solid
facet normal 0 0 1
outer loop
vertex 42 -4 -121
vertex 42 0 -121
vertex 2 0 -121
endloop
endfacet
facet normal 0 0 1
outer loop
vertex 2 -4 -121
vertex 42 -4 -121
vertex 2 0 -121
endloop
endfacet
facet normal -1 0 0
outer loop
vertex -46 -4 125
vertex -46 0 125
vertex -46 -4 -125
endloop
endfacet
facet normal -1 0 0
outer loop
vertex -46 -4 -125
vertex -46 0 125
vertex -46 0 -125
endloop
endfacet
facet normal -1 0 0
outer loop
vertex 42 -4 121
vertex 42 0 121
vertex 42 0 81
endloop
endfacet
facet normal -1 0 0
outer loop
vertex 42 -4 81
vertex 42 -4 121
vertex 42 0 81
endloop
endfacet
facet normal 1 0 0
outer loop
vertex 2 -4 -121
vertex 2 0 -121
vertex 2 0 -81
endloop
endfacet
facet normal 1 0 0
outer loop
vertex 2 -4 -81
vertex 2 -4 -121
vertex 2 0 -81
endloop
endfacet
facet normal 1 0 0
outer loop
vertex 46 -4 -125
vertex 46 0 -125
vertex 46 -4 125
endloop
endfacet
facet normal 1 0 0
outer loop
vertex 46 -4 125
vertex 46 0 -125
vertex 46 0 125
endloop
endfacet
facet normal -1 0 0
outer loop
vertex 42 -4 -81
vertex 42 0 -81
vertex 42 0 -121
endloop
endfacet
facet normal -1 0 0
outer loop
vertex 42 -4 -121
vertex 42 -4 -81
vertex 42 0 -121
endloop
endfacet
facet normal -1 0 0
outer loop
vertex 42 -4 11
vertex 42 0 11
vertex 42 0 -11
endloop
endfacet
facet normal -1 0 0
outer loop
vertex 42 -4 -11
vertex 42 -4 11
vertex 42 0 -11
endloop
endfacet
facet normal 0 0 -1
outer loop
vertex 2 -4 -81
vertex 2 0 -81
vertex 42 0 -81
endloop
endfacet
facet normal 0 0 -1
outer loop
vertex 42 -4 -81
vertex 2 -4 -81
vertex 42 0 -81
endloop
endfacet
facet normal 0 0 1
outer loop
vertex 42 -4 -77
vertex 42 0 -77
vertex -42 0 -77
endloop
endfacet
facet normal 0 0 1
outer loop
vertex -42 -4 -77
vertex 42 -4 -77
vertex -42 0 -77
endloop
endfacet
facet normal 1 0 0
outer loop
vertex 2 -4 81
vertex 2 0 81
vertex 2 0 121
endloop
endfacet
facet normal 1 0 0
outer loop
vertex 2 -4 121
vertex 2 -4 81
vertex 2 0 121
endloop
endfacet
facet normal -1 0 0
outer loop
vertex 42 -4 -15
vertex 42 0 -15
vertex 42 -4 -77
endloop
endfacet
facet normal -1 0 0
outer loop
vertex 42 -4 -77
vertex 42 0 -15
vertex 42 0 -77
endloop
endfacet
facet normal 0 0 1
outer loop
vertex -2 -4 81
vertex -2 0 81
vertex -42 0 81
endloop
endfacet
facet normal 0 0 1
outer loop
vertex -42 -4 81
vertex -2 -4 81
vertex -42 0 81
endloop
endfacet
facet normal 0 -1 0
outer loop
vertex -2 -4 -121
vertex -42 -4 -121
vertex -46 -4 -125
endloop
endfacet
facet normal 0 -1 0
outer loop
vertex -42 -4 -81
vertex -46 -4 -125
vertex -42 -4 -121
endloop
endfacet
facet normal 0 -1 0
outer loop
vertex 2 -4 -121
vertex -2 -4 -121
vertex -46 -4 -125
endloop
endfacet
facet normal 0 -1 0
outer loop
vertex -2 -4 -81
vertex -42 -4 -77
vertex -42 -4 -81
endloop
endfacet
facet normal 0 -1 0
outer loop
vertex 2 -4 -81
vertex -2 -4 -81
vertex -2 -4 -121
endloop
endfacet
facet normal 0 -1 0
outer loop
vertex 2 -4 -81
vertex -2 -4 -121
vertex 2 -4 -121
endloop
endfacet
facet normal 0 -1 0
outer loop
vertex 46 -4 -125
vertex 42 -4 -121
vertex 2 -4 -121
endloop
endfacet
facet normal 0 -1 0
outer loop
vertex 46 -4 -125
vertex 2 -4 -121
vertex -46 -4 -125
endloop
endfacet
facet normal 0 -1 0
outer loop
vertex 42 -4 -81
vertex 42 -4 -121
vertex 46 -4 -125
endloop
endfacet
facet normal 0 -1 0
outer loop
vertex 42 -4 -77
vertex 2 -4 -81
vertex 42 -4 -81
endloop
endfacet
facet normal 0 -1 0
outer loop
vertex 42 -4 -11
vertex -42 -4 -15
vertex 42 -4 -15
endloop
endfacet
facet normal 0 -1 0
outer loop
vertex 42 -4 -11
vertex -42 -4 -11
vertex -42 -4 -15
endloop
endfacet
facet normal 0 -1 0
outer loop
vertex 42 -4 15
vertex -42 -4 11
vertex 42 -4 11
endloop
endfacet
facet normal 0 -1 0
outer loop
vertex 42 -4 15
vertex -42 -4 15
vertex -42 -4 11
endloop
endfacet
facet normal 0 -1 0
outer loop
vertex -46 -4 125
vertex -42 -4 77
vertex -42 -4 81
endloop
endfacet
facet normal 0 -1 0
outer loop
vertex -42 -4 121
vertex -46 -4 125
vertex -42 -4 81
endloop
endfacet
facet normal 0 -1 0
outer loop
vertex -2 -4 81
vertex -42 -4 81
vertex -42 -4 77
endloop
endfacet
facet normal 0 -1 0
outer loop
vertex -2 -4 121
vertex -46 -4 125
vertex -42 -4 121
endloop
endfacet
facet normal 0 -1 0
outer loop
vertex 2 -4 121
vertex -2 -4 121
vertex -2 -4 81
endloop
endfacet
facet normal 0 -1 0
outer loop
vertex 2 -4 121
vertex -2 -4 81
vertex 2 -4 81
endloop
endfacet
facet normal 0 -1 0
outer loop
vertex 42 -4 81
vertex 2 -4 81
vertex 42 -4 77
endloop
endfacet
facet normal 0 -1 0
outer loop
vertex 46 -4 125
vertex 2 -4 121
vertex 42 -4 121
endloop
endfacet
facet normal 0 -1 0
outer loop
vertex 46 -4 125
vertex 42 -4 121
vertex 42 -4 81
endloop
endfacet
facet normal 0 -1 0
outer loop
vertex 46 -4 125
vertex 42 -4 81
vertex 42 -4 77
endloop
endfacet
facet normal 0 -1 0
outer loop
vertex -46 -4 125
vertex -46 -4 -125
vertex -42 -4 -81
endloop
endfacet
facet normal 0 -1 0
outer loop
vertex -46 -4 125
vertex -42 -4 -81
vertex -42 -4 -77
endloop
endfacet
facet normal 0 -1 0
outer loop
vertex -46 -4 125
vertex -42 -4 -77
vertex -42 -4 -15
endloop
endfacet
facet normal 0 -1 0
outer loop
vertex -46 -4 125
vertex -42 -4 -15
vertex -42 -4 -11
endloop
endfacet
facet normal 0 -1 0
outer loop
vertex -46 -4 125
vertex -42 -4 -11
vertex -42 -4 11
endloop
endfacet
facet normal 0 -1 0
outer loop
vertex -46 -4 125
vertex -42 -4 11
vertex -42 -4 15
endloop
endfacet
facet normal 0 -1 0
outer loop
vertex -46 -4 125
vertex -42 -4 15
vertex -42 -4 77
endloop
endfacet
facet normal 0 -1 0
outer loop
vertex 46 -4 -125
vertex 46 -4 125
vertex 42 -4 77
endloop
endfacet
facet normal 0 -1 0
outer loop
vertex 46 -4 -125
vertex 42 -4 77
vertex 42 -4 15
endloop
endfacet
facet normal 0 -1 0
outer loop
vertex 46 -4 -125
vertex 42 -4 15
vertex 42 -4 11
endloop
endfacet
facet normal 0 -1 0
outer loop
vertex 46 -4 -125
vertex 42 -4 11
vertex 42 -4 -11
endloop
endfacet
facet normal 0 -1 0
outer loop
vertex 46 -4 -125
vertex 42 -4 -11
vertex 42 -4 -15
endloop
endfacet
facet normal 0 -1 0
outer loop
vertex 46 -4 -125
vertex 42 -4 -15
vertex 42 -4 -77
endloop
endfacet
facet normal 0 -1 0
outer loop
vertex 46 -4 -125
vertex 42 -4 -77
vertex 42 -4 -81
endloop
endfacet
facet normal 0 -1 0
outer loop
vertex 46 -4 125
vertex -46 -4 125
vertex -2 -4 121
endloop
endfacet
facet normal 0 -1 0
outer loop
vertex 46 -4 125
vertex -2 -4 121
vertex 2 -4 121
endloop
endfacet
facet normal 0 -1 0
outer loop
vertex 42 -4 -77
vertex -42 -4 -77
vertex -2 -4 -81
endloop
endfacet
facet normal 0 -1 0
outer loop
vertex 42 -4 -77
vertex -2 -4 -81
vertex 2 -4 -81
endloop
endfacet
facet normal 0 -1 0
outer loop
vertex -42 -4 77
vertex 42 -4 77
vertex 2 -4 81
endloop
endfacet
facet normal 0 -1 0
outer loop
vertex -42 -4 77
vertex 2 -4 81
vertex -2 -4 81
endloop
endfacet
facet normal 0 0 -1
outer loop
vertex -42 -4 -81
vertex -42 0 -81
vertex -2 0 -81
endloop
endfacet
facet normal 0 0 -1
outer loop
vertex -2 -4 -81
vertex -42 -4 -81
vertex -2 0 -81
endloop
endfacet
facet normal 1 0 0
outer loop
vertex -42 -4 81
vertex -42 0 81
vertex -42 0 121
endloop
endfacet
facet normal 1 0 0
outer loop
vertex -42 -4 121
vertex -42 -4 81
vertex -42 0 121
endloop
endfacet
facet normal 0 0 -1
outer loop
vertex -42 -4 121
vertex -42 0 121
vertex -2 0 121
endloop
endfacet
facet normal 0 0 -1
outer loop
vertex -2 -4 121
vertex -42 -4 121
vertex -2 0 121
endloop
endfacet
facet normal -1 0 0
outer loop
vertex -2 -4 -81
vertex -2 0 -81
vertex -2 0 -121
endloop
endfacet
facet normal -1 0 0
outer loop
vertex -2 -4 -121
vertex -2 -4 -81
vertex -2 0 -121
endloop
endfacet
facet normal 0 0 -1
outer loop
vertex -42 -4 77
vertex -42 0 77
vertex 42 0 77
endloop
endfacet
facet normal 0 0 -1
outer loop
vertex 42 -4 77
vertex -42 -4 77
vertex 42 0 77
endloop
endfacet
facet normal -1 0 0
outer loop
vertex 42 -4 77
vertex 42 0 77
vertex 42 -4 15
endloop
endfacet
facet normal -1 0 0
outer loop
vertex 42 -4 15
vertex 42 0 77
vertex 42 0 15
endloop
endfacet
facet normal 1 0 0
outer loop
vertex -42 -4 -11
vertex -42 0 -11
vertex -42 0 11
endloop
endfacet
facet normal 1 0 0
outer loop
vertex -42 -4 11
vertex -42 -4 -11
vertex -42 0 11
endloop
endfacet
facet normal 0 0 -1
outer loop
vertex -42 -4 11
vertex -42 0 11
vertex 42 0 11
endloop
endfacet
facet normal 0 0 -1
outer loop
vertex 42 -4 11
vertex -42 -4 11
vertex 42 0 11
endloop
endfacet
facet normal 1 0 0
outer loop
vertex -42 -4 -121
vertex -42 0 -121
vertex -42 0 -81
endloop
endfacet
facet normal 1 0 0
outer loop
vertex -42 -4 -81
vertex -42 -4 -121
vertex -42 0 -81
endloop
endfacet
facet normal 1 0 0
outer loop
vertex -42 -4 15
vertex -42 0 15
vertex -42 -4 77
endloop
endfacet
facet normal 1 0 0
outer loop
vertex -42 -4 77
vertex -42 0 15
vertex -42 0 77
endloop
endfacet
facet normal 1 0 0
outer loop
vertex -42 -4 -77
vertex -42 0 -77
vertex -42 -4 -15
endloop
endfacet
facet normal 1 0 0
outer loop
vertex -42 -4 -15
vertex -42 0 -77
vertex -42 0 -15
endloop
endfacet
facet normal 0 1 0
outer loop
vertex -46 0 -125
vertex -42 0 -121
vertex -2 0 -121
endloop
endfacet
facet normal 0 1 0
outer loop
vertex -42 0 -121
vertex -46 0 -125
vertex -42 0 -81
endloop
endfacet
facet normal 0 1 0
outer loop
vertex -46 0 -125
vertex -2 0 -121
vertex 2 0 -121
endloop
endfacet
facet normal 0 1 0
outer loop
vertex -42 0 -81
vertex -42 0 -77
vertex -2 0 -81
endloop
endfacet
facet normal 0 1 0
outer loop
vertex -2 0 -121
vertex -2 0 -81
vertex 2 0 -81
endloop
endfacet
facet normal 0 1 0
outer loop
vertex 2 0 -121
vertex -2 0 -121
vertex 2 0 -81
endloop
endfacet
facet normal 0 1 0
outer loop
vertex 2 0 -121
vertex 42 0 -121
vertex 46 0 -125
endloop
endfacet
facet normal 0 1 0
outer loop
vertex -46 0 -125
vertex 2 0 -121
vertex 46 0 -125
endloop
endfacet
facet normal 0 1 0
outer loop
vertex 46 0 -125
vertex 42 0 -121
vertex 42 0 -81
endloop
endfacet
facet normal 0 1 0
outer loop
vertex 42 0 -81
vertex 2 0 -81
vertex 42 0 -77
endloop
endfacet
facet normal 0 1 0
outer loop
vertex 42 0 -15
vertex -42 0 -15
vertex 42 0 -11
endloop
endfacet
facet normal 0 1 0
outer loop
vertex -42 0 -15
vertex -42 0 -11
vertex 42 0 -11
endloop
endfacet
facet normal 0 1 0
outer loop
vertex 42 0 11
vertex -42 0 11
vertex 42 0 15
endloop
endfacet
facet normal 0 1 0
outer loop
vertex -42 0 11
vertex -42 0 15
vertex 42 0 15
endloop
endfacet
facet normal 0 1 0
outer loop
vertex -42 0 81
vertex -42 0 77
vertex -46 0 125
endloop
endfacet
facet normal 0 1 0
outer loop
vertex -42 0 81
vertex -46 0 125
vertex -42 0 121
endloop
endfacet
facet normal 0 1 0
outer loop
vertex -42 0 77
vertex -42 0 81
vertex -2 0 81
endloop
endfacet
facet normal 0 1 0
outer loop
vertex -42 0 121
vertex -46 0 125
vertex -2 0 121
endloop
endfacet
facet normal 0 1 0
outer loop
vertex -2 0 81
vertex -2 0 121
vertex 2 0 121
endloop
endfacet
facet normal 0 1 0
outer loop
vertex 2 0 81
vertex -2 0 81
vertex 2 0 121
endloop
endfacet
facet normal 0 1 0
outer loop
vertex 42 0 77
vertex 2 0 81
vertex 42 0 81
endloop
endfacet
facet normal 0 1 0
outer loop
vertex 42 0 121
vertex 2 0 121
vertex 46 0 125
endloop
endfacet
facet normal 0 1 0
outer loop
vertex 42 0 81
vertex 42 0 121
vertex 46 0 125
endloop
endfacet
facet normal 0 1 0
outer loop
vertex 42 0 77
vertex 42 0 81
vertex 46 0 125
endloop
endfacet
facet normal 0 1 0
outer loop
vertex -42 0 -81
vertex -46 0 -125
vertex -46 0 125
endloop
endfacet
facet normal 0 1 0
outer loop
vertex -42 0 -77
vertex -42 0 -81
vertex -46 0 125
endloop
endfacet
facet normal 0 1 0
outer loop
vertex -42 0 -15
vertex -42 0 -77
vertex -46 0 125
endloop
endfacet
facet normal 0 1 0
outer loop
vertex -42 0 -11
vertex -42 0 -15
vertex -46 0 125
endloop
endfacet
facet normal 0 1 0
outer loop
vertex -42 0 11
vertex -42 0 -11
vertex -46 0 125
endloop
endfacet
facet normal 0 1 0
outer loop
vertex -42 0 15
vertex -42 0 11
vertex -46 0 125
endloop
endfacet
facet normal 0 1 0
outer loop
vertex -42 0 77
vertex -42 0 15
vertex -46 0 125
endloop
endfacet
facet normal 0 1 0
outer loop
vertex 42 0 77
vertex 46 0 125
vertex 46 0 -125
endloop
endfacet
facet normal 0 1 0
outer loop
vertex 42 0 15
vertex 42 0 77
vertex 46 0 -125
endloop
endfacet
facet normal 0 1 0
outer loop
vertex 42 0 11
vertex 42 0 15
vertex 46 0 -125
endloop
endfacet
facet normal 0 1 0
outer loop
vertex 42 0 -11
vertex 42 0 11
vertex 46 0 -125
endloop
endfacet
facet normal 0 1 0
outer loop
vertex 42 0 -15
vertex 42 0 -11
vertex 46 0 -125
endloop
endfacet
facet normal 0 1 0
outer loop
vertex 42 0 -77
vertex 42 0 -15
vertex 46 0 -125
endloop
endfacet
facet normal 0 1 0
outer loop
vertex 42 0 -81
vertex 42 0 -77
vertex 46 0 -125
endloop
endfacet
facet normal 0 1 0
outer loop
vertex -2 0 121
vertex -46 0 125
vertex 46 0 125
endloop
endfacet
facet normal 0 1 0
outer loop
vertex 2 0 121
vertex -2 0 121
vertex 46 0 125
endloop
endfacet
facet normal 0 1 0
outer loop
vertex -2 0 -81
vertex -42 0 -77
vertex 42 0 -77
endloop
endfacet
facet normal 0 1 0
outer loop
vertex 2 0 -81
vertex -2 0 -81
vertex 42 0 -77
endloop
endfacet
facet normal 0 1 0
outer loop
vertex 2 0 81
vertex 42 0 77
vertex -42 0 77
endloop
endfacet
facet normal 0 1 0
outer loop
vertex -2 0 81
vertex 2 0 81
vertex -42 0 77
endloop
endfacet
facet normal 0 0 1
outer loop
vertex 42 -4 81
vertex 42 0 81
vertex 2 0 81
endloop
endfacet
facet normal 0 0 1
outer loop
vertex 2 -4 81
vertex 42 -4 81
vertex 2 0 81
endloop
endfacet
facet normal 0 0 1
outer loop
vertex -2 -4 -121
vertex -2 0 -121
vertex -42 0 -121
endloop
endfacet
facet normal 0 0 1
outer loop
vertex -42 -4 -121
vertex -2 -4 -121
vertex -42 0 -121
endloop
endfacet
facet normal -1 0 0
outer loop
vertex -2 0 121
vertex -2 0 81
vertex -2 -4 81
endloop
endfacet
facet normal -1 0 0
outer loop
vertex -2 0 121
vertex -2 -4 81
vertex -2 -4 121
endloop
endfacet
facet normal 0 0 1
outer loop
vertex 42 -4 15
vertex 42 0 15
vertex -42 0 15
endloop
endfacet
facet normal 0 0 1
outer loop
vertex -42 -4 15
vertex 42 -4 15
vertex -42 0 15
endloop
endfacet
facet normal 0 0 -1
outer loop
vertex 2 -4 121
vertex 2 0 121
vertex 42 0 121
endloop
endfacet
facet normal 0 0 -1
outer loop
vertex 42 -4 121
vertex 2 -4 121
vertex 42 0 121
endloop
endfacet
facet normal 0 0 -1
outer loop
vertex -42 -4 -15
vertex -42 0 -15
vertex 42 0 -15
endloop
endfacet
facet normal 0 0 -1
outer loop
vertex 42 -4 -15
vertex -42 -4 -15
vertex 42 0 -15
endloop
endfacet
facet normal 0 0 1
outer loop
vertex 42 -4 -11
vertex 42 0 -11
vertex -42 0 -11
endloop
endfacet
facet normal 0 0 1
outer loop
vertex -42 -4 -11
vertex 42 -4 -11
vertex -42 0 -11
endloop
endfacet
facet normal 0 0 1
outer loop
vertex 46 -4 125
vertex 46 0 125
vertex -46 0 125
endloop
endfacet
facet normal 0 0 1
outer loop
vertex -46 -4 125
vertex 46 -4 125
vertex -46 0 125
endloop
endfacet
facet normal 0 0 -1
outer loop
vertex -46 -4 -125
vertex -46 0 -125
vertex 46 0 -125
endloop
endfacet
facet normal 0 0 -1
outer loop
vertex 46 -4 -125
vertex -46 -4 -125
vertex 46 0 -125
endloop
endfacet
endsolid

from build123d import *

# Parameters (mm, degrees)
F0_W     = 2
F0_H     = 40
F0_W_2   = 42
F0_H_2   = 4
F1_DEPTH = 4


with BuildPart() as f1:
    # F0 (on Front) → F1 (new body)
    with BuildSketch(Plane.XZ):
        Polygon((-46, 125), (-46, 0), (-42, 0), (-42, 11), (-42, 15), (-42, 77), (-42, 81), (-42, 121), (-42, 125), align=None)
        Polygon((-42, 0), (-46, 0), (-46, -125), (-42, -125), (-42, -121), (-42, -89), (-42, -81), (-42, -77), (-42, -15), (-42, -11), align=None)
        Polygon((0, 125), (-42, 125), (-42, 121), (-2, 121), (0, 121), align=None)
        Polygon((-42, -121), (-42, -125), (0, -125), (0, -121), (-2, -121), align=None)
        Polygon((42, 11), (42, 0), (46, 0), (46, 125), (42, 125), (42, 121), (42, 81), (42, 77), (42, 15), align=None)
        Polygon((46, 0), (42, 0), (42, -11), (42, -15), (42, -77), (42, -81), (42, -121), (42, -125), (46, -125), align=None)
        Polygon((42, 125), (0, 125), (0, 121), (2, 121), (42, 121), align=None)
        Polygon((0, -121), (0, -125), (42, -125), (42, -121), (2, -121), align=None)
        Polygon((0, -77), (-42, -77), (-42, -81), (-2, -81), (0, -81), align=None)
        Polygon((42, -77), (0, -77), (0, -81), (2, -81), (42, -81), align=None)
        Polygon((-2, -113), (-2, -121), (0, -121), (0, -81), (-2, -81), align=None)
        with Locations((1, -101)):
            Rectangle(F0_W, F0_H)
        with Locations((-21, -13)):
            Rectangle(F0_W_2, F0_H_2)
        with Locations((21, -13)):
            Rectangle(F0_W_2, F0_H_2)
        with Locations((21, 13)):
            Rectangle(F0_W_2, F0_H_2)
        with Locations((-21, 13)):
            Rectangle(F0_W_2, F0_H_2)
        Polygon((-42, 81), (-42, 77), (0, 77), (0, 81), (-2, 81), align=None)
        Polygon((0, 81), (0, 77), (42, 77), (42, 81), (2, 81), align=None)
        with Locations((1, 101)):
            Rectangle(F0_W, F0_H)
        with Locations((-1, 101)):
            Rectangle(F0_W, F0_H)
    extrude(amount=F1_DEPTH)


solid = f1.part
